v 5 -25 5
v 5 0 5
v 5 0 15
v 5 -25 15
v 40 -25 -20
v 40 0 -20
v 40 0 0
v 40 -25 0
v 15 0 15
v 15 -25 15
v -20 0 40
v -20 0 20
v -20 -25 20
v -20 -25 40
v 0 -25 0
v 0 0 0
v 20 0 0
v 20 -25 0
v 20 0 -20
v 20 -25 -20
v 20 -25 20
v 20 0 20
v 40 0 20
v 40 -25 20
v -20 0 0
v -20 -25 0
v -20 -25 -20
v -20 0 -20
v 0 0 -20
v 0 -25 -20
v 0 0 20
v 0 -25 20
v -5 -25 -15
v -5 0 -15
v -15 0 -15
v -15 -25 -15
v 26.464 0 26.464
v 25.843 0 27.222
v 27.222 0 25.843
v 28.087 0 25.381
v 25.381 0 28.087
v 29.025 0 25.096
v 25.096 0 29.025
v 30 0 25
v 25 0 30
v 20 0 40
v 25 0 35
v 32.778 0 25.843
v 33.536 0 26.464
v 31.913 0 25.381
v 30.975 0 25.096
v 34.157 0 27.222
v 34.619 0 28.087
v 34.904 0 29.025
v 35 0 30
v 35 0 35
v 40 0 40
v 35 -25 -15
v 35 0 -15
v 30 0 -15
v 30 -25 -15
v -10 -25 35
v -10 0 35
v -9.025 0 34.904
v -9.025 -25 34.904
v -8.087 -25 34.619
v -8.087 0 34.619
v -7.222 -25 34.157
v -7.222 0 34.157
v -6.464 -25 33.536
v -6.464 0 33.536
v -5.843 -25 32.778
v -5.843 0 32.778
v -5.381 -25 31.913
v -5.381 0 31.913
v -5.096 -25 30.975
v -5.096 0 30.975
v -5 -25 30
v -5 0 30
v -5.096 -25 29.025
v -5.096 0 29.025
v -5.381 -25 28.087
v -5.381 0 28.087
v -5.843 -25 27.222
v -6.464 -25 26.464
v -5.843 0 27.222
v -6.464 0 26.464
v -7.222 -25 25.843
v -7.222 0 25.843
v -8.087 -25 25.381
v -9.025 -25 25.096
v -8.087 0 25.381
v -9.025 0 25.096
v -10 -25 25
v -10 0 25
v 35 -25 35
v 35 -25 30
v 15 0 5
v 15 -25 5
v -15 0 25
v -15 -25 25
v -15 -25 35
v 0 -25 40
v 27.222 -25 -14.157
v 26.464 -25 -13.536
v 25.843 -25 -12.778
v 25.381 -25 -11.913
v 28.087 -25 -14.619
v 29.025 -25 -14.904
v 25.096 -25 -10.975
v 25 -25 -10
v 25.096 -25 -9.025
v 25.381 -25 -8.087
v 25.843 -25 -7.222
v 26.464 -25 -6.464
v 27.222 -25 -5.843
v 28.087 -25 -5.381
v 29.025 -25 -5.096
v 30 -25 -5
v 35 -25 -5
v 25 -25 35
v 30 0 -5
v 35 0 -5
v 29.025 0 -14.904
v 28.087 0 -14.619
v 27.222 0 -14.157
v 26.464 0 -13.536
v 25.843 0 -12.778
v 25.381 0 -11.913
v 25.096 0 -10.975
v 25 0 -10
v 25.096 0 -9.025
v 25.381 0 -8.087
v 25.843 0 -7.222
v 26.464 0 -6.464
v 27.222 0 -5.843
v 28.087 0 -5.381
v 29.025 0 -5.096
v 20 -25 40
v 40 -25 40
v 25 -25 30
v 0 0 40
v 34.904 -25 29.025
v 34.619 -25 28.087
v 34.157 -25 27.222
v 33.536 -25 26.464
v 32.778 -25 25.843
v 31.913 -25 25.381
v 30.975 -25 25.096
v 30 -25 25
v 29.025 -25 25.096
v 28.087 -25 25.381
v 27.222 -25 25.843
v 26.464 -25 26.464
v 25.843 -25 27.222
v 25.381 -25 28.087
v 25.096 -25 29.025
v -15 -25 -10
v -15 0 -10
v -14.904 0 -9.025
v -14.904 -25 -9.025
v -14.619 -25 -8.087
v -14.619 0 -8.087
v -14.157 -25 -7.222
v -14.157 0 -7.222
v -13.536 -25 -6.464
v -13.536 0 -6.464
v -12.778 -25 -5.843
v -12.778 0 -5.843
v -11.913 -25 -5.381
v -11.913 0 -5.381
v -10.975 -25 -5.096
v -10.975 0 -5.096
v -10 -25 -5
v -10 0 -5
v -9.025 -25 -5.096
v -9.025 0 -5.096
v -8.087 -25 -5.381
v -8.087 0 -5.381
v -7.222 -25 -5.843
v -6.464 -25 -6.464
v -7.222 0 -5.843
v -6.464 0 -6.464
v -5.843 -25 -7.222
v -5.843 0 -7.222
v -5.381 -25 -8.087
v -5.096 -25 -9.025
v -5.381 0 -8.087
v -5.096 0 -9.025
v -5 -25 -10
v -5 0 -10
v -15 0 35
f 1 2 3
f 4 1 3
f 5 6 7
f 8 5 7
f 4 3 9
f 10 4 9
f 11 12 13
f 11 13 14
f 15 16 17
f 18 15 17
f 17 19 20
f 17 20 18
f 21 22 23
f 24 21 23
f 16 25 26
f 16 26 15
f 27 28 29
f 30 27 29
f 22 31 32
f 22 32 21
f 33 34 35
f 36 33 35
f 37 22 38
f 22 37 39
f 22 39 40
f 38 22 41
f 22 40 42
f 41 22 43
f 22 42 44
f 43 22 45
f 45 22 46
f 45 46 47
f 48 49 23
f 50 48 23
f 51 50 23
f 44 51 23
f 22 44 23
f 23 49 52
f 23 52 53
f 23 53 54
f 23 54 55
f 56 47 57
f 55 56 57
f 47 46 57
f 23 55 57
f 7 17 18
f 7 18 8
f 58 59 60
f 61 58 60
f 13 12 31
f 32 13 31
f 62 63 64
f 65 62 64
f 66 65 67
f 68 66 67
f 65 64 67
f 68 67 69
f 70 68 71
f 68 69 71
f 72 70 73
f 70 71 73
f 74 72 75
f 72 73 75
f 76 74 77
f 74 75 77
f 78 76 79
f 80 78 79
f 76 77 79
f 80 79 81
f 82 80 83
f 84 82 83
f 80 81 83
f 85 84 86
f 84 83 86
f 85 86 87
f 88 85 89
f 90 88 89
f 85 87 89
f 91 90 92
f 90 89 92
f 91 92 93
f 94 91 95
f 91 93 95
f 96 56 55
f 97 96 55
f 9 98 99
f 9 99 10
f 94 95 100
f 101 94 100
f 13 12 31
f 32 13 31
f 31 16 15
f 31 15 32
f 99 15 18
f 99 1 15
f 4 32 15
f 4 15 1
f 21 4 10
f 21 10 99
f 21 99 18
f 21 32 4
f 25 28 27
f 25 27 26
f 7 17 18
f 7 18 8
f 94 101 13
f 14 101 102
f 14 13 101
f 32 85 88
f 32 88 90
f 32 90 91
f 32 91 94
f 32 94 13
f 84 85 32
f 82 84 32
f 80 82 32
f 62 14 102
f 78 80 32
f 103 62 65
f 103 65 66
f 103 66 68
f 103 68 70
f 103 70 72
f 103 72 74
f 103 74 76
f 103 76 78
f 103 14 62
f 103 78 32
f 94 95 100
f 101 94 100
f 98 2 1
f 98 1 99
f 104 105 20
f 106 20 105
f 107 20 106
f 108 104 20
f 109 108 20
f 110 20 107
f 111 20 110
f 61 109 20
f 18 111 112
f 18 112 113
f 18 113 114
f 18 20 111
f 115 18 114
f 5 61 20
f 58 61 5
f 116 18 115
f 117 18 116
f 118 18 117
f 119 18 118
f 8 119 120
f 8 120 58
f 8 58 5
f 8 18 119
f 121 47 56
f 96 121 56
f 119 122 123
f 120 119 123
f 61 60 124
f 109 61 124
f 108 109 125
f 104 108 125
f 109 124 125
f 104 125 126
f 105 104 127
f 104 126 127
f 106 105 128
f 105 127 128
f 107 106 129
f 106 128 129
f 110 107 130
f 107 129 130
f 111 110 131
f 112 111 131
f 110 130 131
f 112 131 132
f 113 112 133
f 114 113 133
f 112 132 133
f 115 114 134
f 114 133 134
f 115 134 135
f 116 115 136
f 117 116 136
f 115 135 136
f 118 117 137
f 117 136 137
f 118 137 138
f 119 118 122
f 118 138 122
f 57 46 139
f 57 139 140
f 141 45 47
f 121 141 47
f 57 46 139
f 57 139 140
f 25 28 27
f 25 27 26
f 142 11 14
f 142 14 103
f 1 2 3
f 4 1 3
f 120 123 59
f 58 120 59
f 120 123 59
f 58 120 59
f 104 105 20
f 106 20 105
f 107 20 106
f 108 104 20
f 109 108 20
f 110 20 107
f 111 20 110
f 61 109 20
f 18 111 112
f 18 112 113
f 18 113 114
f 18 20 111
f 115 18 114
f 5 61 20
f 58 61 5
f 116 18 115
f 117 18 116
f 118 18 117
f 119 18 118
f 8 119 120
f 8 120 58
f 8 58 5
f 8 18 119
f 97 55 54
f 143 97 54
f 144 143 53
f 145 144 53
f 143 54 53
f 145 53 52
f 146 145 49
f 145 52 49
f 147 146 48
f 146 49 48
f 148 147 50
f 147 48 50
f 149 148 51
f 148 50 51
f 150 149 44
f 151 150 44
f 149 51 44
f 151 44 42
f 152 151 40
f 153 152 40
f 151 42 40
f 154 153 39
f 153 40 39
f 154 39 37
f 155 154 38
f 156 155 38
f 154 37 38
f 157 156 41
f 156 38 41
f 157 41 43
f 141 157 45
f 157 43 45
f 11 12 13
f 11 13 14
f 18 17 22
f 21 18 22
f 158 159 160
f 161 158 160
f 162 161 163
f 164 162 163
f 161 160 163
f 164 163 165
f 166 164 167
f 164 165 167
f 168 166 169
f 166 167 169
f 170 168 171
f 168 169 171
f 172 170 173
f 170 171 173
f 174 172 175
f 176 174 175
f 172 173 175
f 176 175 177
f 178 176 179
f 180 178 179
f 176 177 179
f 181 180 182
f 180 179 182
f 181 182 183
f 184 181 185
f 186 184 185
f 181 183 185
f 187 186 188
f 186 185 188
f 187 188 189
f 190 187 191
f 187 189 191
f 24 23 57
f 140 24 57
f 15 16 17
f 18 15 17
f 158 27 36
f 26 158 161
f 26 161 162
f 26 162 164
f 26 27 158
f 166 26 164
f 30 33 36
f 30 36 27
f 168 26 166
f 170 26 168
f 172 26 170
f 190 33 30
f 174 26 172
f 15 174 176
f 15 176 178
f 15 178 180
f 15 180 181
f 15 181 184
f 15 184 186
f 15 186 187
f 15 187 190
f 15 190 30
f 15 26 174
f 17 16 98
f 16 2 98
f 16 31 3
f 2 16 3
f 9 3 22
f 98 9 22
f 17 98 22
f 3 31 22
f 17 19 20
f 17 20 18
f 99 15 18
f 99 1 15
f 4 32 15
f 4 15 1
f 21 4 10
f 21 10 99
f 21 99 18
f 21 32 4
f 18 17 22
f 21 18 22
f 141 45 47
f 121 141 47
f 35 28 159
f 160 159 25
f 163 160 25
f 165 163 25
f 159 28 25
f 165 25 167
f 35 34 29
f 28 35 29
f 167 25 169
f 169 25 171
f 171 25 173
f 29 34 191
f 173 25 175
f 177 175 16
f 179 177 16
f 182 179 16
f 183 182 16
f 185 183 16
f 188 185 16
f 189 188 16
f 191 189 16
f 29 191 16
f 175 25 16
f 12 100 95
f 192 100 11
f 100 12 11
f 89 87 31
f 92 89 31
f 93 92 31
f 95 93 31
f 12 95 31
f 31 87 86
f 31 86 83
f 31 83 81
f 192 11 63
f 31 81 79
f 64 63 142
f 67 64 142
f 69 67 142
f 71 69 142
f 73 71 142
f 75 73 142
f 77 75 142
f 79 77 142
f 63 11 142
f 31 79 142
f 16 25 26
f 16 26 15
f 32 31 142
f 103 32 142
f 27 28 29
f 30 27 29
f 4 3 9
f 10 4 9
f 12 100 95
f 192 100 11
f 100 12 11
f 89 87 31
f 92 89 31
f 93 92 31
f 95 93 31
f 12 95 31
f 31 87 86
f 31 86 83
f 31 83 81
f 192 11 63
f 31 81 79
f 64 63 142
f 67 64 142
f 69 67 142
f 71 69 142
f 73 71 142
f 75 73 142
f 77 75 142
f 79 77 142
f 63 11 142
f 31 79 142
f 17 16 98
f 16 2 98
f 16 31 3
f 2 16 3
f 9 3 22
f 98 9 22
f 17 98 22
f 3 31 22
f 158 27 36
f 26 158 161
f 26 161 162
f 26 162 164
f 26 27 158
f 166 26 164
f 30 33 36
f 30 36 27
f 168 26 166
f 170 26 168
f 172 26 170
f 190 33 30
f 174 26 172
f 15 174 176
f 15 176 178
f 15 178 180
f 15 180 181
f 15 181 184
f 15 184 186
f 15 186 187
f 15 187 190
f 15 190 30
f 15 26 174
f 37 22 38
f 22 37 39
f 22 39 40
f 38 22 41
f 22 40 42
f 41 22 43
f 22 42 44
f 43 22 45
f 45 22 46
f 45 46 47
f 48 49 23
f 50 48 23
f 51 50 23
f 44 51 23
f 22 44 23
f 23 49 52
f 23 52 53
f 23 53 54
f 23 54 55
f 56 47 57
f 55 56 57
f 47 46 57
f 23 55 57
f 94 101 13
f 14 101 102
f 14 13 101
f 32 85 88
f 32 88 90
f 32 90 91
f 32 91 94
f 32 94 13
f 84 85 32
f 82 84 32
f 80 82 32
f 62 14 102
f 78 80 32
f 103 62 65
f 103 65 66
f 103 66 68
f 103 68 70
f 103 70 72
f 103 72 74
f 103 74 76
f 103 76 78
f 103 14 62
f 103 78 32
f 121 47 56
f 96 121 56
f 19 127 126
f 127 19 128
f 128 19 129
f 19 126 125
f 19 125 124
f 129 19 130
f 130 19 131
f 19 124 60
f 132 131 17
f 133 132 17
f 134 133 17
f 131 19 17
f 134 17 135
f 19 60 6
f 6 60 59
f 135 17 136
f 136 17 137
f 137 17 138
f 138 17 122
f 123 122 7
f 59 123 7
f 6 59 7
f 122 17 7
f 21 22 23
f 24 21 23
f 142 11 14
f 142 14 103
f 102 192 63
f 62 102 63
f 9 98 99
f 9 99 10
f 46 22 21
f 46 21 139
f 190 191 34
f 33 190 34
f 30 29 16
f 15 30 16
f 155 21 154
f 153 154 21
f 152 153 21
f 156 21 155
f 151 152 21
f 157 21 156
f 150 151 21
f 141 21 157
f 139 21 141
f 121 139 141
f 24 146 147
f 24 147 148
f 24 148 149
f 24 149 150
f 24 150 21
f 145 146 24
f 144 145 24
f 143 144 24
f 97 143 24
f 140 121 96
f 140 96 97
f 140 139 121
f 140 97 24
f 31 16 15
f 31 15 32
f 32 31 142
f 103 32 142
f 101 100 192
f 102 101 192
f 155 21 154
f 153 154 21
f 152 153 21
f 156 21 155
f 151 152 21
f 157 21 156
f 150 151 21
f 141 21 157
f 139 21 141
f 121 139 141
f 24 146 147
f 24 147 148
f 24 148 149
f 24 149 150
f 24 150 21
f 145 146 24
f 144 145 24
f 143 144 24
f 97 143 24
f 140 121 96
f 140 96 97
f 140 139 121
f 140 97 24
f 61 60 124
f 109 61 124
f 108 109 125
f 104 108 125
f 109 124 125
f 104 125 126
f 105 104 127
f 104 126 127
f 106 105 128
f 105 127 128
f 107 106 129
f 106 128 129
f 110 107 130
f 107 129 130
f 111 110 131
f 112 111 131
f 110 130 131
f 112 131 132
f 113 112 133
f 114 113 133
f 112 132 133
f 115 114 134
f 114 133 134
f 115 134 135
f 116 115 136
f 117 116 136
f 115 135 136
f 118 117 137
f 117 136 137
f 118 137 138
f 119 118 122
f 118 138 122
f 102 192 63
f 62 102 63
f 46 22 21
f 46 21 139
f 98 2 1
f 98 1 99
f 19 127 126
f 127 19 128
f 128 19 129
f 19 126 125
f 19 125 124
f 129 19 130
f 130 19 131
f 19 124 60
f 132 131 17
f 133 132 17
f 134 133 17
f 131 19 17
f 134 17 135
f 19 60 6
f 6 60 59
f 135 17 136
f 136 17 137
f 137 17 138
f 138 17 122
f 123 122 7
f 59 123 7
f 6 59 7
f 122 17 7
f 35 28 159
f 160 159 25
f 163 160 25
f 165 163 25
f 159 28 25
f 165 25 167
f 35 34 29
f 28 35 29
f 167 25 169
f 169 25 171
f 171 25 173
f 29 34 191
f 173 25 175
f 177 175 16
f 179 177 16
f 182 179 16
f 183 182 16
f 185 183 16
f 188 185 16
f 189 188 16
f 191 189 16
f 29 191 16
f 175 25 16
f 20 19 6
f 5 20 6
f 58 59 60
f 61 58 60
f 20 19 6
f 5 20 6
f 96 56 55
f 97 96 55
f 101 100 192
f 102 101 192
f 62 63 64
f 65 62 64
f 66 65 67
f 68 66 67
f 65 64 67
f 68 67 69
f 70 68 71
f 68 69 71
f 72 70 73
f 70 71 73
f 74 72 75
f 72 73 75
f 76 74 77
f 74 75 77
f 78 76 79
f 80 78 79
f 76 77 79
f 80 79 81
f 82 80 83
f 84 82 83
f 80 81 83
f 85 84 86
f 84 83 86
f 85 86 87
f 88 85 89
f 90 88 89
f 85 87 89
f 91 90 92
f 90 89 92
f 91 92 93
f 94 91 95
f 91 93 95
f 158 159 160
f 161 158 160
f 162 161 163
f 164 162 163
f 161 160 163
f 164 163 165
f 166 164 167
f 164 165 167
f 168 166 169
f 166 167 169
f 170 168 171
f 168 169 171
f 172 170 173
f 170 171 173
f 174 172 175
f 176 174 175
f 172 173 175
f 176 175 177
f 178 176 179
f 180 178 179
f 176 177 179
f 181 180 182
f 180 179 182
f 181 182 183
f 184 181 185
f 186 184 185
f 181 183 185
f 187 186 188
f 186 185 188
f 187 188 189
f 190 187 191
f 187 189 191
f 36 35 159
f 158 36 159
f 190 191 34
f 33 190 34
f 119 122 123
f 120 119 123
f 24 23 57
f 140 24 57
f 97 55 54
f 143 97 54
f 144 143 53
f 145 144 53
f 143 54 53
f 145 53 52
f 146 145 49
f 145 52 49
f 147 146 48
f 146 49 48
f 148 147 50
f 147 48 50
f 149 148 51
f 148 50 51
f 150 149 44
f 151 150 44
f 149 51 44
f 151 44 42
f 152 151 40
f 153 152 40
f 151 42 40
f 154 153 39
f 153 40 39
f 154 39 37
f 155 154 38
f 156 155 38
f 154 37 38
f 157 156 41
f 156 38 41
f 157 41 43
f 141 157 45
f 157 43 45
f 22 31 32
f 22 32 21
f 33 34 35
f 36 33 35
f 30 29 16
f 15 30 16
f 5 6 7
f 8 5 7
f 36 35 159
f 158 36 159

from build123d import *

# Parameters (mm, degrees)
F0_W     = 20
F0_H     = 20
F0_W_2   = 10
F0_H_2   = 10
F1_DEPTH = 25
F2_DEPTH = 25


with BuildPart() as f1:
    # F0 (on Front) → F1 (new body)
    with BuildSketch(Plane.XZ):
        with Locations((10, 10)):
            Rectangle(F0_W, F0_H)
        with Locations((10, 10)):
            Rectangle(F0_W_2, F0_H_2, mode=Mode.SUBTRACT)
        with Locations((30, -10)):
            Rectangle(F0_W, F0_H)
        with BuildLine():
            Line((35, -5), (35, -15))
            Line((35, -15), (30, -15))
            ThreePointArc((30, -15), (25, -10), (30, -5))
            Line((30, -5), (35, -5))
        make_face(mode=Mode.SUBTRACT)
        with Locations((-10, 30)):
            Rectangle(F0_W, F0_H)
        with BuildLine():
            ThreePointArc((-10, 35), (-5, 30), (-10, 25))
            Line((-10, 25), (-15, 25))
            Line((-15, 25), (-15, 35))
            Line((-15, 35), (-10, 35))
        make_face(mode=Mode.SUBTRACT)
        with Locations((-10, -10)):
            Rectangle(F0_W, F0_H)
        with BuildLine():
            Line((-5, -10), (-5, -15))
            Line((-5, -15), (-15, -15))
            Line((-15, -15), (-15, -10))
            ThreePointArc((-15, -10), (-10, -5), (-5, -10))
        make_face(mode=Mode.SUBTRACT)
        with Locations((30, 30)):
            Rectangle(F0_W, F0_H)
        with BuildLine():
            Line((25, 35), (35, 35))
            Line((35, 35), (35, 30))
            ThreePointArc((35, 30), (30, 25), (25, 30))
            Line((25, 30), (25, 35))
        make_face(mode=Mode.SUBTRACT)
    extrude(amount=F1_DEPTH)


with BuildPart() as f2:
    # F0 (on Front) → F2 (new body)
    with BuildSketch(Plane.XZ):
        with Locations((10, 10)):
            Rectangle(F0_W, F0_H)
        with Locations((10, 10)):
            Rectangle(F0_W_2, F0_H_2, mode=Mode.SUBTRACT)
        with Locations((-10, 30)):
            Rectangle(F0_W, F0_H)
        with BuildLine():
            ThreePointArc((-10, 35), (-5, 30), (-10, 25))
            Line((-10, 25), (-15, 25))
            Line((-15, 25), (-15, 35))
            Line((-15, 35), (-10, 35))
        make_face(mode=Mode.SUBTRACT)
        with Locations((30, 30)):
            Rectangle(F0_W, F0_H)
        with BuildLine():
            Line((25, 35), (35, 35))
            Line((35, 35), (35, 30))
            ThreePointArc((35, 30), (30, 25), (25, 30))
            Line((25, 30), (25, 35))
        make_face(mode=Mode.SUBTRACT)
        with Locations((30, -10)):
            Rectangle(F0_W, F0_H)
        with BuildLine():
            Line((35, -5), (35, -15))
            Line((35, -15), (30, -15))
            ThreePointArc((30, -15), (25, -10), (30, -5))
            Line((30, -5), (35, -5))
        make_face(mode=Mode.SUBTRACT)
        with Locations((-10, -10)):
            Rectangle(F0_W, F0_H)
        with BuildLine():
            Line((-5, -10), (-5, -15))
            Line((-5, -15), (-15, -15))
            Line((-15, -15), (-15, -10))
            ThreePointArc((-15, -10), (-10, -5), (-5, -10))
        make_face(mode=Mode.SUBTRACT)
    extrude(amount=F2_DEPTH)


solid = Compound([f1.part, f2.part])
